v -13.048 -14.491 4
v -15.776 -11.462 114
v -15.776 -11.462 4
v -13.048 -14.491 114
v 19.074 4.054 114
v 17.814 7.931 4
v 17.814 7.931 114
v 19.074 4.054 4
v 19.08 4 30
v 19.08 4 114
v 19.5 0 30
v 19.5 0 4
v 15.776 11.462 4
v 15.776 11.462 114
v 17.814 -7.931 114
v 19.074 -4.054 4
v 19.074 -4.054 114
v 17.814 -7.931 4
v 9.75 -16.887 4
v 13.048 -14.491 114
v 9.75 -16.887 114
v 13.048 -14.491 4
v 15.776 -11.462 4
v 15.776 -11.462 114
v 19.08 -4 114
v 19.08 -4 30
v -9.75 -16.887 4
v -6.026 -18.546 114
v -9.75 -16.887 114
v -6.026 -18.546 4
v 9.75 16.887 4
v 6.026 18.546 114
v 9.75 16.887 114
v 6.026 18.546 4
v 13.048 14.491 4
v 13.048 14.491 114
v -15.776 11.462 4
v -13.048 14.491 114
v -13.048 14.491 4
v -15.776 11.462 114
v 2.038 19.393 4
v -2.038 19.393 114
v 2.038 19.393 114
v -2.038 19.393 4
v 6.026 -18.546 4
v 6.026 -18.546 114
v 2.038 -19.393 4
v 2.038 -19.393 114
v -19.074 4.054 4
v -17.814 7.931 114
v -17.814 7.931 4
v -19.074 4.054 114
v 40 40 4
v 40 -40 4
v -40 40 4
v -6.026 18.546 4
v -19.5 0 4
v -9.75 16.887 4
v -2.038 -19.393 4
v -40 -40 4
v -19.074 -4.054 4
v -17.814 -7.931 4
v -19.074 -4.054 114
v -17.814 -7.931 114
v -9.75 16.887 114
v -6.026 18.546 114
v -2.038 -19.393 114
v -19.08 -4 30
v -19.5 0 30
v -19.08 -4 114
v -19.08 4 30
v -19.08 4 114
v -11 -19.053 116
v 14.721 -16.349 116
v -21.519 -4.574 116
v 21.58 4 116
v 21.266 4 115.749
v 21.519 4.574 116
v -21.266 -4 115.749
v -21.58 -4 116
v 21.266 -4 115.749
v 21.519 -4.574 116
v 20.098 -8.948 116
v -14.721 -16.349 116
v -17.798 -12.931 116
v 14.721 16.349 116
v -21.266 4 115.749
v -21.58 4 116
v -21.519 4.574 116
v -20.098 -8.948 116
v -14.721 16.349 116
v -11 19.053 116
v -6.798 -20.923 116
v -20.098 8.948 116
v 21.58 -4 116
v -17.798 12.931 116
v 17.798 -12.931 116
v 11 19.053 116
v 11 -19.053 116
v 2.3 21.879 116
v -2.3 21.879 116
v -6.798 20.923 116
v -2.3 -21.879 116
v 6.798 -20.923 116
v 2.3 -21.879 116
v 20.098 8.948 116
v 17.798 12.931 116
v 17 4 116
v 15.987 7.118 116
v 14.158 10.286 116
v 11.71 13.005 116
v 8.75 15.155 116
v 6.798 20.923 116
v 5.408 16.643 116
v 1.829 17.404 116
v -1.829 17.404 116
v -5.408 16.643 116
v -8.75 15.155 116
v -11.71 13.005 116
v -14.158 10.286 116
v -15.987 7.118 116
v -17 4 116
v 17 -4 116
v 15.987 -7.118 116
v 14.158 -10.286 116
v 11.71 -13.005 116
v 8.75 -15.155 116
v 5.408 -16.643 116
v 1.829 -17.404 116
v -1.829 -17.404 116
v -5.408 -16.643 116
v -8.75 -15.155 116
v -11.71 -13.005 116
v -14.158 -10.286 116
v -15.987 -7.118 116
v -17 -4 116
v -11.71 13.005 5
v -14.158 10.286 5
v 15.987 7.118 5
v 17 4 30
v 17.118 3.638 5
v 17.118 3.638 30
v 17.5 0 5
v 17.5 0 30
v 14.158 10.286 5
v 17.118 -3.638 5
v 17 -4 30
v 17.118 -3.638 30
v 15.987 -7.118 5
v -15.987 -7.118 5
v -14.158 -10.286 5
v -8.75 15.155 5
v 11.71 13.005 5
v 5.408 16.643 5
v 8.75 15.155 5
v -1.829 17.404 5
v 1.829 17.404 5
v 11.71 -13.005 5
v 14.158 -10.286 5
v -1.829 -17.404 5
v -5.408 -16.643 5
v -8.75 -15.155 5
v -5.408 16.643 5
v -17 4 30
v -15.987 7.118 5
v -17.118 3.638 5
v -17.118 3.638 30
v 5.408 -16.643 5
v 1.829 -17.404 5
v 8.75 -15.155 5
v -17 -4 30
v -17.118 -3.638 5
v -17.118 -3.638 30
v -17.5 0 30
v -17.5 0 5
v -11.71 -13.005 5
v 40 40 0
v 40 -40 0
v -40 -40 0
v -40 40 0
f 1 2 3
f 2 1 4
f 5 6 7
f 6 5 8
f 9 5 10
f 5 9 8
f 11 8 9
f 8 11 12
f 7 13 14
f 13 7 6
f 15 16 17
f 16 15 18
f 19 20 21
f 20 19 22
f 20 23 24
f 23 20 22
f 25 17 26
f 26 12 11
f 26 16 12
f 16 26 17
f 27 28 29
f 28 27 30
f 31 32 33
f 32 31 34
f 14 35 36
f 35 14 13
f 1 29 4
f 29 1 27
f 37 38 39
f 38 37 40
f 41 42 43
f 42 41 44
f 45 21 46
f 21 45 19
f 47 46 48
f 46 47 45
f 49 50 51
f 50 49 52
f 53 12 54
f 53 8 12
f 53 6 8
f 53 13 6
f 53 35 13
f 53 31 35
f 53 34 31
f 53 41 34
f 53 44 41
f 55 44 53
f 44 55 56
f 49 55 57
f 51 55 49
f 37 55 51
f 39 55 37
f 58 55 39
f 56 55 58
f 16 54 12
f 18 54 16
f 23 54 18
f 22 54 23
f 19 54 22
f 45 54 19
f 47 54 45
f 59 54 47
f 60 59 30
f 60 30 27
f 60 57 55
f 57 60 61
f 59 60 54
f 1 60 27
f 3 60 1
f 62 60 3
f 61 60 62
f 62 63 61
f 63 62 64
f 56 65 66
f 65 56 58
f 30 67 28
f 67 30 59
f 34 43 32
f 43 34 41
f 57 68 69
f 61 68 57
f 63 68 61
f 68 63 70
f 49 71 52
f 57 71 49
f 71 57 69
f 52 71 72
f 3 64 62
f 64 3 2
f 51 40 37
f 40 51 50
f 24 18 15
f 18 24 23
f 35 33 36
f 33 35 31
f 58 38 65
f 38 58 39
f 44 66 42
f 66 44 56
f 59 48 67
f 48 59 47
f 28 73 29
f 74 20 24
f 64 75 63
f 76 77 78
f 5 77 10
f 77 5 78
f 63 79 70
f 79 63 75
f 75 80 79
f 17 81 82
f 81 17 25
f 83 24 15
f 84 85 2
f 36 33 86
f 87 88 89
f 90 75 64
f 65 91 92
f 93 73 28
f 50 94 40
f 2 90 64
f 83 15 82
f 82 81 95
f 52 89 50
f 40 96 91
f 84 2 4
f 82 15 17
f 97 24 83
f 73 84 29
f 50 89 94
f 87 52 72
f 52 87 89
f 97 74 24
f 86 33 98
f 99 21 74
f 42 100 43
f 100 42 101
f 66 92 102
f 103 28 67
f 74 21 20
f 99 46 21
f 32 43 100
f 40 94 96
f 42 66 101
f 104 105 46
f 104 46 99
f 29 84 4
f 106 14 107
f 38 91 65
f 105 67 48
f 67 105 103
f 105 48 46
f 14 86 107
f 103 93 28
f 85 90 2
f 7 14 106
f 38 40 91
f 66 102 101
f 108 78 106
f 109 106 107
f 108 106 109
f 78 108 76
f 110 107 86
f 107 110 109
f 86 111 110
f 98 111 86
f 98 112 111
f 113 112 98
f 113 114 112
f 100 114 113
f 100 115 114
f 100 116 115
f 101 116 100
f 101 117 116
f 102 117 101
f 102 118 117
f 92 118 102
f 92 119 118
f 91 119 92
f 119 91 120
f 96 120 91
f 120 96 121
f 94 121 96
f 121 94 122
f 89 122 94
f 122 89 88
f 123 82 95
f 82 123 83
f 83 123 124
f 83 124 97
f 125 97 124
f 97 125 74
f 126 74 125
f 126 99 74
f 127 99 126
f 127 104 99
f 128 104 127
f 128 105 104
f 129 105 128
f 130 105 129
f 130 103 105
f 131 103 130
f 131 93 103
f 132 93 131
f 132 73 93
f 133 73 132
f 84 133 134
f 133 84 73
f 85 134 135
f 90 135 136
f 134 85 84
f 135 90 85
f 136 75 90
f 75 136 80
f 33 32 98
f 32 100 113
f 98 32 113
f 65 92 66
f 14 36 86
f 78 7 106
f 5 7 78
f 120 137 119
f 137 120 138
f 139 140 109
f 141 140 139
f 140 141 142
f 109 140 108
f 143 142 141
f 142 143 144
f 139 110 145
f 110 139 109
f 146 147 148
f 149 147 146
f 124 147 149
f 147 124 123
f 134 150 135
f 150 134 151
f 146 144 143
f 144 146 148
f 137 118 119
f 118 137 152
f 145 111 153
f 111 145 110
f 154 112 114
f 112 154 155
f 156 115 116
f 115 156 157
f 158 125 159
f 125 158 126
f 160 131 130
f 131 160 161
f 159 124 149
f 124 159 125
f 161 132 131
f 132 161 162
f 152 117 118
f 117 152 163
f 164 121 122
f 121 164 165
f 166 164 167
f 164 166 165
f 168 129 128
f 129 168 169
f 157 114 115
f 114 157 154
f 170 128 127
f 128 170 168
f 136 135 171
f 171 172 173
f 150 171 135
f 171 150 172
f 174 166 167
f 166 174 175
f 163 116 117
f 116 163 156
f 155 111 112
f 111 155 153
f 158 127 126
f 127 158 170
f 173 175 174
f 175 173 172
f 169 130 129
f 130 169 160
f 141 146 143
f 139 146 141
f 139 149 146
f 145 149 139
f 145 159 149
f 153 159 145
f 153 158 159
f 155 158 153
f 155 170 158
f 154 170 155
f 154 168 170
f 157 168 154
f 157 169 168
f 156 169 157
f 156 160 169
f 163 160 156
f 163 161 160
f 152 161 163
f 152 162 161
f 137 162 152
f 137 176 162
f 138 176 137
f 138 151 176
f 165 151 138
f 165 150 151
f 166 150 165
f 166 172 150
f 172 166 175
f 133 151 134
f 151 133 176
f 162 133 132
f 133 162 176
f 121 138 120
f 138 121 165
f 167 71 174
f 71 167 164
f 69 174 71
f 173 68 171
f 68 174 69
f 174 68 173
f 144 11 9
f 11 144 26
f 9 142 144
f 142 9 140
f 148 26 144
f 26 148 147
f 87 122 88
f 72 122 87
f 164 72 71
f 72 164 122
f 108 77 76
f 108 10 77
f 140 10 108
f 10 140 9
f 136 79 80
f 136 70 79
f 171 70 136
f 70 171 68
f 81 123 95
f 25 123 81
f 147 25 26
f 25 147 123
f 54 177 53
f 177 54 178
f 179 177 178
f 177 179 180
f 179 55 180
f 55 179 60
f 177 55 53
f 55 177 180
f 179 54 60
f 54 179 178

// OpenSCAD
base_thickness=4;
base_width=80;

tp_height=110;
tp_radius=19.5;
tp_thickness=2;

cap_radius=22;
cap_thickness=2;

slit_thickness=8;

// Base
translate([-base_width/2, -base_width/2,0])
	cube(size=[base_width,base_width,base_thickness]);

difference() {
	union() {
		// tube
		translate([0,0,base_thickness])		
			cylinder(h=tp_height,r=tp_radius);

		//endcap
		translate([0,0,base_thickness+tp_height])
			cylinder(h=cap_thickness, r1 =tp_radius, r2=cap_radius);
	}
	// hollow ceter
	translate([0,0,5])
		cylinder(h=tp_height+cap_thickness, r=tp_radius-tp_thickness);
	// side holes
	translate([-base_width/2,-slit_thickness/2,30])
		cube(size=[base_width, slit_thickness,tp_height+cap_thickness]);
}
